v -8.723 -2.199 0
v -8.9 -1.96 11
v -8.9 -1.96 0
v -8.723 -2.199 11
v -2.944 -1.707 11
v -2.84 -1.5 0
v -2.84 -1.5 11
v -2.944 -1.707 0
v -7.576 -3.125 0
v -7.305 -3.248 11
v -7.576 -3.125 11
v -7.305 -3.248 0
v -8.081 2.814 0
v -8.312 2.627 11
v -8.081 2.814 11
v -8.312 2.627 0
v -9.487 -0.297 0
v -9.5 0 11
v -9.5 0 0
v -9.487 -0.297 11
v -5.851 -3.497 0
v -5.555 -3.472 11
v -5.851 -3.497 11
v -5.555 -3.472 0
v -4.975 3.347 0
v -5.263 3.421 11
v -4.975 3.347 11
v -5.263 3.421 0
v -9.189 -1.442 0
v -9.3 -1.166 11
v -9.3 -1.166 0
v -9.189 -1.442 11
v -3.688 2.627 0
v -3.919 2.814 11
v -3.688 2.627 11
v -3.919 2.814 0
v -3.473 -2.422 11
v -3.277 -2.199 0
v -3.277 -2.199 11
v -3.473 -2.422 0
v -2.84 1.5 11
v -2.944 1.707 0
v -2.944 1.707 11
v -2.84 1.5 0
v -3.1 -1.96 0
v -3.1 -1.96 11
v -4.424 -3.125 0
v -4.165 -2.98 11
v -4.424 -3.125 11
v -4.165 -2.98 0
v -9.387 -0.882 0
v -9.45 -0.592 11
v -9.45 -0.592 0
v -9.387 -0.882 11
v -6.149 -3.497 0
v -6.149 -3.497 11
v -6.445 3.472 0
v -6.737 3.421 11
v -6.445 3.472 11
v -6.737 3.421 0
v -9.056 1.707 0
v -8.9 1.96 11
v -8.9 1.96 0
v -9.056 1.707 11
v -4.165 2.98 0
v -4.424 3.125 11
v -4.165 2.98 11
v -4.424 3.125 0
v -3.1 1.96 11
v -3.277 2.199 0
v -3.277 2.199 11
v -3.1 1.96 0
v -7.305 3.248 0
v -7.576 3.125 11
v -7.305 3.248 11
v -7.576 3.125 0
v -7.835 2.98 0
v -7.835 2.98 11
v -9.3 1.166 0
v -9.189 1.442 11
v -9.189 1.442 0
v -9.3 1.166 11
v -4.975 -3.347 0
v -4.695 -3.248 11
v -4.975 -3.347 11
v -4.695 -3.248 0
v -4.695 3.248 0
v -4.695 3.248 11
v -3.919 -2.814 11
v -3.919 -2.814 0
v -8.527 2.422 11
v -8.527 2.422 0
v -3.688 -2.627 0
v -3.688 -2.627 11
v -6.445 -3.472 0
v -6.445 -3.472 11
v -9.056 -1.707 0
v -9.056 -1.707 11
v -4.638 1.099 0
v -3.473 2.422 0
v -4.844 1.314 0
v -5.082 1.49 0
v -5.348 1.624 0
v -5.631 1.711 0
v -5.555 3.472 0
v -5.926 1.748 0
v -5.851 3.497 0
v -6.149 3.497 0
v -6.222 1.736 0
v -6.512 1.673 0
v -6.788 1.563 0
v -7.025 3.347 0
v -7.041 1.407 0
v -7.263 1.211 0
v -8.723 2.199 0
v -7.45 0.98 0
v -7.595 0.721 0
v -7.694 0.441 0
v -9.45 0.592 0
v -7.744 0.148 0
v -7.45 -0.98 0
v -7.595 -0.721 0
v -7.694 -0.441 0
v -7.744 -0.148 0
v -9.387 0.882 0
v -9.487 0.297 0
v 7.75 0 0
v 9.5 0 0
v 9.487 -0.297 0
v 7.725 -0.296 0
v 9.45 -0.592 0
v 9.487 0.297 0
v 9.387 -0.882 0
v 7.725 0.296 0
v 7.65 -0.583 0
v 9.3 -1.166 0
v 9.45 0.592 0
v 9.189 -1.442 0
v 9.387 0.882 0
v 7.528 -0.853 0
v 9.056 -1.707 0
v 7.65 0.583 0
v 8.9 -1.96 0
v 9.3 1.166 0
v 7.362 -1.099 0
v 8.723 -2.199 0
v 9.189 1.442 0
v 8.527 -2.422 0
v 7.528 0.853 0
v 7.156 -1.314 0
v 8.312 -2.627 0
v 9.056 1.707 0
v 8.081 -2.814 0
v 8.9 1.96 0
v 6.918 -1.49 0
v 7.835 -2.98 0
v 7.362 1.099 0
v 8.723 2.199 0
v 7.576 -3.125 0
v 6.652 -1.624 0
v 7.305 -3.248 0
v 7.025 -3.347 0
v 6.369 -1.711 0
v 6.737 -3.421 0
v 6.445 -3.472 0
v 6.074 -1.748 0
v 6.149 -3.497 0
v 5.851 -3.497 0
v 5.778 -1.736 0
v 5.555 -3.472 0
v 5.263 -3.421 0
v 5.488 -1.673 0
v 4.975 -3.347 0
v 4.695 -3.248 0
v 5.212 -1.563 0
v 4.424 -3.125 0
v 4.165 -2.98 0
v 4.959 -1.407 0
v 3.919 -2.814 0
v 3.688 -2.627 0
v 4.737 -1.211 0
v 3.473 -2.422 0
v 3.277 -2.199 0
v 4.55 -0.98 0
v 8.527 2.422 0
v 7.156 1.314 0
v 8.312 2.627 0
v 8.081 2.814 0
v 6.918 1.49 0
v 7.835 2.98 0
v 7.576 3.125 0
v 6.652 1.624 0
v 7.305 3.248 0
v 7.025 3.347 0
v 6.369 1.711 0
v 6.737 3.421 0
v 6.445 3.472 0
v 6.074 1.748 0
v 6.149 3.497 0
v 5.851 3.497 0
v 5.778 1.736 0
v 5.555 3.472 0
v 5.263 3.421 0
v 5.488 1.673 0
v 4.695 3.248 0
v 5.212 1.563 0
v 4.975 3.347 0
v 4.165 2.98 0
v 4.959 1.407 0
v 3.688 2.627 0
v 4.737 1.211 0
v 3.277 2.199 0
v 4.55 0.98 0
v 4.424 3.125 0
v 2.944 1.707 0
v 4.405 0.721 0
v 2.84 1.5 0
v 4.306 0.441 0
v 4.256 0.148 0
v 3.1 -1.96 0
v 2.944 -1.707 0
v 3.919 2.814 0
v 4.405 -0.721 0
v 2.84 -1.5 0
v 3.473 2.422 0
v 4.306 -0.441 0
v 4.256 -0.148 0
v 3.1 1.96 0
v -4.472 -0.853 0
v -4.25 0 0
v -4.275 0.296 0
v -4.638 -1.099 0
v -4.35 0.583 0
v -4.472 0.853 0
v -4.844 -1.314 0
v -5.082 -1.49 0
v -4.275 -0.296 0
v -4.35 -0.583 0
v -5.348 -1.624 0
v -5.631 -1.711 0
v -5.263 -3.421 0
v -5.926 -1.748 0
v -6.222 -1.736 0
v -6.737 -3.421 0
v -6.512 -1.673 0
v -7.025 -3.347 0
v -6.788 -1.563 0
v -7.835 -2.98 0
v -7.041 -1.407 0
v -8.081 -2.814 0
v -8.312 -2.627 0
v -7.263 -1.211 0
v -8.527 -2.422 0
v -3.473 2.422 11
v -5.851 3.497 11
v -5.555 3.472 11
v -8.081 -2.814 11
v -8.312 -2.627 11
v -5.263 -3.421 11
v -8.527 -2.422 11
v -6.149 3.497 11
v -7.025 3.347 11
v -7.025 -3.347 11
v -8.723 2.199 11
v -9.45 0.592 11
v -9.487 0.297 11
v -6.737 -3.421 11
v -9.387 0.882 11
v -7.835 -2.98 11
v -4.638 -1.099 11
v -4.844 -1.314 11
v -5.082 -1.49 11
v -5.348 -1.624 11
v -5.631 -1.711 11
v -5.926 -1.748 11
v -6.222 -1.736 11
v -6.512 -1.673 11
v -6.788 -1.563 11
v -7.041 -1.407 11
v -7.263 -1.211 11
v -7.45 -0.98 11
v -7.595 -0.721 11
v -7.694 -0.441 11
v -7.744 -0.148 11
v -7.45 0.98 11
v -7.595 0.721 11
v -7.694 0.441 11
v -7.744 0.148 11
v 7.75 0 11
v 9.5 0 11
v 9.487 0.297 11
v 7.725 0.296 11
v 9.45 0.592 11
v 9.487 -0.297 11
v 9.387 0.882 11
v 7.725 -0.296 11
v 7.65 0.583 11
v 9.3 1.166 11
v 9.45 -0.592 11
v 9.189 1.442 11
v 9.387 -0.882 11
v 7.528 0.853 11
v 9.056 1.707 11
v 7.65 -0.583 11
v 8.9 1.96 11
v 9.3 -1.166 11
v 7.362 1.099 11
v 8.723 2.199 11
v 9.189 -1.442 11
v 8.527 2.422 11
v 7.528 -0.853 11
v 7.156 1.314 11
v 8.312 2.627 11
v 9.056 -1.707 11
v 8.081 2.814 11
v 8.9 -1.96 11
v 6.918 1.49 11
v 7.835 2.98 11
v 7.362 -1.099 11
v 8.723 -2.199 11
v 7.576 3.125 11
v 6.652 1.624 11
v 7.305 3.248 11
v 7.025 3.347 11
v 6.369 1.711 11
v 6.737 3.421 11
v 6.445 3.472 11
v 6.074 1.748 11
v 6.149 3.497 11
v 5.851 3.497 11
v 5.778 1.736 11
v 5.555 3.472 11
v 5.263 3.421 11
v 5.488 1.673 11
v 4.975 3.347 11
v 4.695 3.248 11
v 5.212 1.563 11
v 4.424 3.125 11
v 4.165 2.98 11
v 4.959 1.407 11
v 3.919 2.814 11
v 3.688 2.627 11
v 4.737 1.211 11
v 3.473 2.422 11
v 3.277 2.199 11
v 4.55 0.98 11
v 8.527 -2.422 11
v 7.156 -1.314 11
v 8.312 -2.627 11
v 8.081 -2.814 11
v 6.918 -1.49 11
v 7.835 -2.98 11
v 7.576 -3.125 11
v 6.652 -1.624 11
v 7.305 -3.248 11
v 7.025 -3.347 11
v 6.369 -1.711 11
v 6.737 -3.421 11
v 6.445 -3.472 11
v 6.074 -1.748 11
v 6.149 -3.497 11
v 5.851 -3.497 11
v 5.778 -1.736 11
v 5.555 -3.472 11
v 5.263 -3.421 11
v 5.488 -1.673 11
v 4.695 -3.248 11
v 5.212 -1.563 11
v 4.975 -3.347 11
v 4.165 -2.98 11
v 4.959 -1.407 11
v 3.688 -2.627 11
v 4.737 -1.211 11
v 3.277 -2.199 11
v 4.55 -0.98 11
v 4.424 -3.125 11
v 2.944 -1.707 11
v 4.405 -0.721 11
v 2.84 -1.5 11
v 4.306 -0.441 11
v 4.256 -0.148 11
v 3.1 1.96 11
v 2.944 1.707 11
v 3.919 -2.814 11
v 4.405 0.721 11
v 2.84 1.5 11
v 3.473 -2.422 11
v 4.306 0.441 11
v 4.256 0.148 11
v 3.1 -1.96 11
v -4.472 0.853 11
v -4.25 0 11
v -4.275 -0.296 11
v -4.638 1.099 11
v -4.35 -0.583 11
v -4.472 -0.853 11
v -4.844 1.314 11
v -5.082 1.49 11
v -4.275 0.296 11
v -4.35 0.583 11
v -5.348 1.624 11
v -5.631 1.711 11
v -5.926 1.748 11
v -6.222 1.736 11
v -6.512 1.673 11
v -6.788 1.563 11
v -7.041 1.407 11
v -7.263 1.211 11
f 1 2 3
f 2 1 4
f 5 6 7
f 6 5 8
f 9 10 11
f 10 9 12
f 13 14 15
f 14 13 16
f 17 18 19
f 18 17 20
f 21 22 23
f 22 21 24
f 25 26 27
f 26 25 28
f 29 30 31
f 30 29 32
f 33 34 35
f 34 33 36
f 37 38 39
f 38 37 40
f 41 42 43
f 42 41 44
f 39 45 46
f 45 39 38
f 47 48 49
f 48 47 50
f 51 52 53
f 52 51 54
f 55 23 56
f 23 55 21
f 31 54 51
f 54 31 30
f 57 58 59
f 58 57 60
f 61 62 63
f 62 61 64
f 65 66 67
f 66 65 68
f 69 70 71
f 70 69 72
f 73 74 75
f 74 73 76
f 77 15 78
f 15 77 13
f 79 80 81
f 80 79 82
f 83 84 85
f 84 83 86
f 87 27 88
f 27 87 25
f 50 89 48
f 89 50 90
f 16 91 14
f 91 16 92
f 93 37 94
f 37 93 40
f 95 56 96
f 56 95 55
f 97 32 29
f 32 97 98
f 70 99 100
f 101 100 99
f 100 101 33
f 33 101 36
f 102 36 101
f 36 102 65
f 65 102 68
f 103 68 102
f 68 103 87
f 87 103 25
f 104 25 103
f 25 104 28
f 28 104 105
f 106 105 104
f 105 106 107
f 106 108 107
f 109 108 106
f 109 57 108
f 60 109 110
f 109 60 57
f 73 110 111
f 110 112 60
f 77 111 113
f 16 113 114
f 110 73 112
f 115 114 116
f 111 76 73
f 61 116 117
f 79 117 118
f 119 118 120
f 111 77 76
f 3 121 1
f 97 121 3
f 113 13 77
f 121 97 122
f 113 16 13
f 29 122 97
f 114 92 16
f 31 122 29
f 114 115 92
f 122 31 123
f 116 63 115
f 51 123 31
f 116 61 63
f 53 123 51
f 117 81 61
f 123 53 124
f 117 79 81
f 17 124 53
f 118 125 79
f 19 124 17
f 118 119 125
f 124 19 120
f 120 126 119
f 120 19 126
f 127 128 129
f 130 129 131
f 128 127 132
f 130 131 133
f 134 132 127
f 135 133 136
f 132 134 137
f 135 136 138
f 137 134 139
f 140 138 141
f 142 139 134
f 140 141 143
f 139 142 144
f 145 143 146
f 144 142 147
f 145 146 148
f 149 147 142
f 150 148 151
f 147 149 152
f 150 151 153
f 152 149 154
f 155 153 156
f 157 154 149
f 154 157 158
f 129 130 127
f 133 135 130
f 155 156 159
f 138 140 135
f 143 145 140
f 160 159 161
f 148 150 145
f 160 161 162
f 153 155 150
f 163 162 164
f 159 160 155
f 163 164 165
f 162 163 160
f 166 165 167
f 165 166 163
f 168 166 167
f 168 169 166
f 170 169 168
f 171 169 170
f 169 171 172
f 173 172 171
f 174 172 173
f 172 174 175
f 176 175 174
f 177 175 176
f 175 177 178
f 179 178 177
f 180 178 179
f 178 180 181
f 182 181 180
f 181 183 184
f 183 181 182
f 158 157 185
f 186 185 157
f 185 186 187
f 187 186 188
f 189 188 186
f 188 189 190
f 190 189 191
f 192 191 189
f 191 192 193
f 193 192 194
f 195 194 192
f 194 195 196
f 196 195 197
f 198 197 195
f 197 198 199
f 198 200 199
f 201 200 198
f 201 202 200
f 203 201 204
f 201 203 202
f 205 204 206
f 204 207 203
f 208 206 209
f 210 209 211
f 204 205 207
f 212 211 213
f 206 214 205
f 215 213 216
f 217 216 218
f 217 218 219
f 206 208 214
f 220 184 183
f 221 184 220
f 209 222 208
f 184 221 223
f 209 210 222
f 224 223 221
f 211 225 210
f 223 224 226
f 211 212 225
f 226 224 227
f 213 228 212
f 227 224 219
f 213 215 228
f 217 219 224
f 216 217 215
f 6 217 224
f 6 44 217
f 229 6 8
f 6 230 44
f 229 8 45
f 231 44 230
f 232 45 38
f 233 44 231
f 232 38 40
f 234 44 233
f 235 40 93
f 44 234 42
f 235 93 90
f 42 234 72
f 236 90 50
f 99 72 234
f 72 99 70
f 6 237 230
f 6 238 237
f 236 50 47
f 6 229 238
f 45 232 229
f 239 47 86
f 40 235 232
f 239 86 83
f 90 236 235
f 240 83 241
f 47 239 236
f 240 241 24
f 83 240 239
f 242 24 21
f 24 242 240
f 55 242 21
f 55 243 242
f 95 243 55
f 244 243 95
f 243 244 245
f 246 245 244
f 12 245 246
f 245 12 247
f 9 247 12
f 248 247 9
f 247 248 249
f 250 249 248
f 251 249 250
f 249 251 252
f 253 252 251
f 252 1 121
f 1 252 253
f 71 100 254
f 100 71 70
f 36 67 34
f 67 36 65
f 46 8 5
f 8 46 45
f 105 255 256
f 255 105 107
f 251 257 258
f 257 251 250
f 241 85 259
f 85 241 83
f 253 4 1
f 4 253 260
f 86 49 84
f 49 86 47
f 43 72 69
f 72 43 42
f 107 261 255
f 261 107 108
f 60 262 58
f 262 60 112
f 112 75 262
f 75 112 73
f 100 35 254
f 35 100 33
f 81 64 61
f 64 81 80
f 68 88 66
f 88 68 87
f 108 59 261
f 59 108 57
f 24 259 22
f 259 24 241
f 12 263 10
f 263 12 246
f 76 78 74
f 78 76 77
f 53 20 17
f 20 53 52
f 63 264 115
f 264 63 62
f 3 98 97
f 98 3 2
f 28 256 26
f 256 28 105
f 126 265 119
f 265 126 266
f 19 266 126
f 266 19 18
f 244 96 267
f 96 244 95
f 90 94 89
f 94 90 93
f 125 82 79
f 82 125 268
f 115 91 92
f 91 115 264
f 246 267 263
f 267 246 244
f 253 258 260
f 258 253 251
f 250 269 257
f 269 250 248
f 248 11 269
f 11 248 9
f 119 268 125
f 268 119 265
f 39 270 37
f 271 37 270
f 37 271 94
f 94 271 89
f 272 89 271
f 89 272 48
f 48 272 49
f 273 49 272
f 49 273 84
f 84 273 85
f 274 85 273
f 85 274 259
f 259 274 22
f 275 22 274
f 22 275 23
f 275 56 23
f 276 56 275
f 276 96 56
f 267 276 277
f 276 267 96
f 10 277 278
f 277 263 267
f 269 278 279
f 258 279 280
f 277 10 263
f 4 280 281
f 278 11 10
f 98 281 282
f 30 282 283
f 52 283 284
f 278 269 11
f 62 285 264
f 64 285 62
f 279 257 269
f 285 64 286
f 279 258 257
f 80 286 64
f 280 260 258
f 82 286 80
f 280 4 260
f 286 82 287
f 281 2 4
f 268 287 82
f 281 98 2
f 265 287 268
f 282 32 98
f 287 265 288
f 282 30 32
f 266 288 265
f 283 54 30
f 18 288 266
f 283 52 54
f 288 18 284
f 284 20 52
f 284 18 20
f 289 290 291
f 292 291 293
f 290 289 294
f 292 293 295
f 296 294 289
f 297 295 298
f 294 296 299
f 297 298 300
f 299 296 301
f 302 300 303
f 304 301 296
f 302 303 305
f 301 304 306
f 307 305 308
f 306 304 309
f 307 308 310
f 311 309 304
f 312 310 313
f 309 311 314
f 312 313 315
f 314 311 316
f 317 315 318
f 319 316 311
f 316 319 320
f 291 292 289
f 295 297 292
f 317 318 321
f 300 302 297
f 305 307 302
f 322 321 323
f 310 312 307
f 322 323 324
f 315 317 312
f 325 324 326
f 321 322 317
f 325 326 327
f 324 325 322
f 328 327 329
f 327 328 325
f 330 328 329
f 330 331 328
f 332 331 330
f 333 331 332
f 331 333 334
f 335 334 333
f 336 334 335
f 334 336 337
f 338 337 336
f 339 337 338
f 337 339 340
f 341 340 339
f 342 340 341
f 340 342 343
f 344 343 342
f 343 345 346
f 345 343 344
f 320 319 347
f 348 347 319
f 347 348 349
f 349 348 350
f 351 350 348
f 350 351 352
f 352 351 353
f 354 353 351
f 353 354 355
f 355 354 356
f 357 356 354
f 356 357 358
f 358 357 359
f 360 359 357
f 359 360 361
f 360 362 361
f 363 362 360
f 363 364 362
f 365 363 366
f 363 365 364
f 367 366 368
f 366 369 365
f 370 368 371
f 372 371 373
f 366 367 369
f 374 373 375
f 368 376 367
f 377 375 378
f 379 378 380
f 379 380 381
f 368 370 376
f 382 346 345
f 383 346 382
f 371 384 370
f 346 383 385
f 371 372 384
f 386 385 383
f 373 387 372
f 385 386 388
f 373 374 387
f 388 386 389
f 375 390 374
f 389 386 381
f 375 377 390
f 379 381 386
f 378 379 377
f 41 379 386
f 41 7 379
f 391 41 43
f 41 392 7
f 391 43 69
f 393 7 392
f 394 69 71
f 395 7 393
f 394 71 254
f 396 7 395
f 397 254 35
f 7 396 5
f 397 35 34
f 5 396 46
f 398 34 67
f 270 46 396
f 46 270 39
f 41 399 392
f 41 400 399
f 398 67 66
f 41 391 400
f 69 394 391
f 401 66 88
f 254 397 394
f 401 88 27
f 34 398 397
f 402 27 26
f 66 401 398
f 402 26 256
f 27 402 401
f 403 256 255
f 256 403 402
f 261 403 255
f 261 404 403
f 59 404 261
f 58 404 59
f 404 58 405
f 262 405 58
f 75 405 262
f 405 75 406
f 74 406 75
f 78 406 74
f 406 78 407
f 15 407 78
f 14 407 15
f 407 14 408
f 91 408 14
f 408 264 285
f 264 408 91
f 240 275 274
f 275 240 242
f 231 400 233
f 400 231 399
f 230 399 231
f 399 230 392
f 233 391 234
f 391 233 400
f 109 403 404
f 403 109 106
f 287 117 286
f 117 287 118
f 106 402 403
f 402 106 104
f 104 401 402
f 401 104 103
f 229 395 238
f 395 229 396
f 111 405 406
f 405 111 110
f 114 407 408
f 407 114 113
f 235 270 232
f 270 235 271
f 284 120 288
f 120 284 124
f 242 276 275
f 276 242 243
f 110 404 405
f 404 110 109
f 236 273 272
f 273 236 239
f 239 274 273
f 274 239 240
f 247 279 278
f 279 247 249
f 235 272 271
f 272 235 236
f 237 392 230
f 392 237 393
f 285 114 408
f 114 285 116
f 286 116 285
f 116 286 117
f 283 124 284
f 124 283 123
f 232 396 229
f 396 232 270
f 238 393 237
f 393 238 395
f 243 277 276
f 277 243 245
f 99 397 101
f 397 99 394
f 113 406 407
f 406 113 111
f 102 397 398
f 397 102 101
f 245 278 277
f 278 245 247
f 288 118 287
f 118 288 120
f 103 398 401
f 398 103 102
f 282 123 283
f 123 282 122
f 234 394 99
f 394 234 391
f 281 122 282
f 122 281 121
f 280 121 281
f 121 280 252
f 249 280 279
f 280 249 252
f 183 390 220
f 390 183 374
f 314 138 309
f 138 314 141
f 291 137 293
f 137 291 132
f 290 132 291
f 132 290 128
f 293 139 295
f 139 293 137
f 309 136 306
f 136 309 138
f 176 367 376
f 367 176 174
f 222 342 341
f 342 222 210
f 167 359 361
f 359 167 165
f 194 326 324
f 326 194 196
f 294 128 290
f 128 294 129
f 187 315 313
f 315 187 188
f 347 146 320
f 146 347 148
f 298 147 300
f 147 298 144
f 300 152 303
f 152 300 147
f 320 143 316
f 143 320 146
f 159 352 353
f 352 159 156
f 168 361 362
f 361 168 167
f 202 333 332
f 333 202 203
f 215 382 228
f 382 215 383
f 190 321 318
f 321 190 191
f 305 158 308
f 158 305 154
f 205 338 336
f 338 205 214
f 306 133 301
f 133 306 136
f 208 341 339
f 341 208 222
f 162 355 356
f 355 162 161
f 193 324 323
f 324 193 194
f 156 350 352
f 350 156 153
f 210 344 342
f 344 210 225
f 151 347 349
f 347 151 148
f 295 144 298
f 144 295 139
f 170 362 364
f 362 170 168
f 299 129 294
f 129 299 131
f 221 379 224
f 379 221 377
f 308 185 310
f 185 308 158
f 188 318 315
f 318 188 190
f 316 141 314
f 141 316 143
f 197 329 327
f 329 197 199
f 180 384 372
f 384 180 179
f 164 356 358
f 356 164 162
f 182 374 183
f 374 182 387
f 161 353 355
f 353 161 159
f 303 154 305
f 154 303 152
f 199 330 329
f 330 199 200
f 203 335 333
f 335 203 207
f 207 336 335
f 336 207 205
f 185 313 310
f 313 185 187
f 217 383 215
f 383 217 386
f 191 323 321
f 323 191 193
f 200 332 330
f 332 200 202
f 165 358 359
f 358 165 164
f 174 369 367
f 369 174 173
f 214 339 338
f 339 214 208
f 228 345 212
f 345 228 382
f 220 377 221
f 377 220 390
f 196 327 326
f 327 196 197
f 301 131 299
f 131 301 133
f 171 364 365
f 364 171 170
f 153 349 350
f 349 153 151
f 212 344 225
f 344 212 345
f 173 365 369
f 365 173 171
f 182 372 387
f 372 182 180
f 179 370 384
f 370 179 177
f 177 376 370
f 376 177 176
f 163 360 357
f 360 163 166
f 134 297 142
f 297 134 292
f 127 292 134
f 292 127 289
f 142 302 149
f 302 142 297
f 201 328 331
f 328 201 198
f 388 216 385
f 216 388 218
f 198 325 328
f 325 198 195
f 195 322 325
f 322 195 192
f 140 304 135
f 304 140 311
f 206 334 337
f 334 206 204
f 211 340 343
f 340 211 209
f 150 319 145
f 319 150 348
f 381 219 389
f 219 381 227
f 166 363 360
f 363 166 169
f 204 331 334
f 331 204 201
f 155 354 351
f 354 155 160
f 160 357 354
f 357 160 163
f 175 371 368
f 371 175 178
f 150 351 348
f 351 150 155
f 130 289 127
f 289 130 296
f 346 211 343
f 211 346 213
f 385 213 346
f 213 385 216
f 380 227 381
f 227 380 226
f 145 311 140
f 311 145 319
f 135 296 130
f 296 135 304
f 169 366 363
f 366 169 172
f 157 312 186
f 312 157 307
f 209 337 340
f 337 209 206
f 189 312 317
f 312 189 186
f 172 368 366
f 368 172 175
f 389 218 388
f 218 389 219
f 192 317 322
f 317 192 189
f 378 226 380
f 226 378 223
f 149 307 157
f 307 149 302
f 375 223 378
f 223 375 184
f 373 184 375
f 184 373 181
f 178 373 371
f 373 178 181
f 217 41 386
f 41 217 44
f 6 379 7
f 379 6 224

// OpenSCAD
module tube(id=1, od=2, height = 5) {
    difference() {
        cylinder(d=od, h=height);
        translate([0,0,-1])cylinder(d=id, h=height+2);
        
    }
}

module bedMountSpacer(height = 5) {
    id=3.5;
    od=7;

    translate([-6,0,0])tube(id=id, od=od, height=height);
    translate([6,0,0])tube(id=id, od=od, height=height);
    translate([0,0,height/2])cube([14-od, 3, height], center=true);
}

$fs=0.3;
$fa=3;
bedMountSpacer(height = 11);
